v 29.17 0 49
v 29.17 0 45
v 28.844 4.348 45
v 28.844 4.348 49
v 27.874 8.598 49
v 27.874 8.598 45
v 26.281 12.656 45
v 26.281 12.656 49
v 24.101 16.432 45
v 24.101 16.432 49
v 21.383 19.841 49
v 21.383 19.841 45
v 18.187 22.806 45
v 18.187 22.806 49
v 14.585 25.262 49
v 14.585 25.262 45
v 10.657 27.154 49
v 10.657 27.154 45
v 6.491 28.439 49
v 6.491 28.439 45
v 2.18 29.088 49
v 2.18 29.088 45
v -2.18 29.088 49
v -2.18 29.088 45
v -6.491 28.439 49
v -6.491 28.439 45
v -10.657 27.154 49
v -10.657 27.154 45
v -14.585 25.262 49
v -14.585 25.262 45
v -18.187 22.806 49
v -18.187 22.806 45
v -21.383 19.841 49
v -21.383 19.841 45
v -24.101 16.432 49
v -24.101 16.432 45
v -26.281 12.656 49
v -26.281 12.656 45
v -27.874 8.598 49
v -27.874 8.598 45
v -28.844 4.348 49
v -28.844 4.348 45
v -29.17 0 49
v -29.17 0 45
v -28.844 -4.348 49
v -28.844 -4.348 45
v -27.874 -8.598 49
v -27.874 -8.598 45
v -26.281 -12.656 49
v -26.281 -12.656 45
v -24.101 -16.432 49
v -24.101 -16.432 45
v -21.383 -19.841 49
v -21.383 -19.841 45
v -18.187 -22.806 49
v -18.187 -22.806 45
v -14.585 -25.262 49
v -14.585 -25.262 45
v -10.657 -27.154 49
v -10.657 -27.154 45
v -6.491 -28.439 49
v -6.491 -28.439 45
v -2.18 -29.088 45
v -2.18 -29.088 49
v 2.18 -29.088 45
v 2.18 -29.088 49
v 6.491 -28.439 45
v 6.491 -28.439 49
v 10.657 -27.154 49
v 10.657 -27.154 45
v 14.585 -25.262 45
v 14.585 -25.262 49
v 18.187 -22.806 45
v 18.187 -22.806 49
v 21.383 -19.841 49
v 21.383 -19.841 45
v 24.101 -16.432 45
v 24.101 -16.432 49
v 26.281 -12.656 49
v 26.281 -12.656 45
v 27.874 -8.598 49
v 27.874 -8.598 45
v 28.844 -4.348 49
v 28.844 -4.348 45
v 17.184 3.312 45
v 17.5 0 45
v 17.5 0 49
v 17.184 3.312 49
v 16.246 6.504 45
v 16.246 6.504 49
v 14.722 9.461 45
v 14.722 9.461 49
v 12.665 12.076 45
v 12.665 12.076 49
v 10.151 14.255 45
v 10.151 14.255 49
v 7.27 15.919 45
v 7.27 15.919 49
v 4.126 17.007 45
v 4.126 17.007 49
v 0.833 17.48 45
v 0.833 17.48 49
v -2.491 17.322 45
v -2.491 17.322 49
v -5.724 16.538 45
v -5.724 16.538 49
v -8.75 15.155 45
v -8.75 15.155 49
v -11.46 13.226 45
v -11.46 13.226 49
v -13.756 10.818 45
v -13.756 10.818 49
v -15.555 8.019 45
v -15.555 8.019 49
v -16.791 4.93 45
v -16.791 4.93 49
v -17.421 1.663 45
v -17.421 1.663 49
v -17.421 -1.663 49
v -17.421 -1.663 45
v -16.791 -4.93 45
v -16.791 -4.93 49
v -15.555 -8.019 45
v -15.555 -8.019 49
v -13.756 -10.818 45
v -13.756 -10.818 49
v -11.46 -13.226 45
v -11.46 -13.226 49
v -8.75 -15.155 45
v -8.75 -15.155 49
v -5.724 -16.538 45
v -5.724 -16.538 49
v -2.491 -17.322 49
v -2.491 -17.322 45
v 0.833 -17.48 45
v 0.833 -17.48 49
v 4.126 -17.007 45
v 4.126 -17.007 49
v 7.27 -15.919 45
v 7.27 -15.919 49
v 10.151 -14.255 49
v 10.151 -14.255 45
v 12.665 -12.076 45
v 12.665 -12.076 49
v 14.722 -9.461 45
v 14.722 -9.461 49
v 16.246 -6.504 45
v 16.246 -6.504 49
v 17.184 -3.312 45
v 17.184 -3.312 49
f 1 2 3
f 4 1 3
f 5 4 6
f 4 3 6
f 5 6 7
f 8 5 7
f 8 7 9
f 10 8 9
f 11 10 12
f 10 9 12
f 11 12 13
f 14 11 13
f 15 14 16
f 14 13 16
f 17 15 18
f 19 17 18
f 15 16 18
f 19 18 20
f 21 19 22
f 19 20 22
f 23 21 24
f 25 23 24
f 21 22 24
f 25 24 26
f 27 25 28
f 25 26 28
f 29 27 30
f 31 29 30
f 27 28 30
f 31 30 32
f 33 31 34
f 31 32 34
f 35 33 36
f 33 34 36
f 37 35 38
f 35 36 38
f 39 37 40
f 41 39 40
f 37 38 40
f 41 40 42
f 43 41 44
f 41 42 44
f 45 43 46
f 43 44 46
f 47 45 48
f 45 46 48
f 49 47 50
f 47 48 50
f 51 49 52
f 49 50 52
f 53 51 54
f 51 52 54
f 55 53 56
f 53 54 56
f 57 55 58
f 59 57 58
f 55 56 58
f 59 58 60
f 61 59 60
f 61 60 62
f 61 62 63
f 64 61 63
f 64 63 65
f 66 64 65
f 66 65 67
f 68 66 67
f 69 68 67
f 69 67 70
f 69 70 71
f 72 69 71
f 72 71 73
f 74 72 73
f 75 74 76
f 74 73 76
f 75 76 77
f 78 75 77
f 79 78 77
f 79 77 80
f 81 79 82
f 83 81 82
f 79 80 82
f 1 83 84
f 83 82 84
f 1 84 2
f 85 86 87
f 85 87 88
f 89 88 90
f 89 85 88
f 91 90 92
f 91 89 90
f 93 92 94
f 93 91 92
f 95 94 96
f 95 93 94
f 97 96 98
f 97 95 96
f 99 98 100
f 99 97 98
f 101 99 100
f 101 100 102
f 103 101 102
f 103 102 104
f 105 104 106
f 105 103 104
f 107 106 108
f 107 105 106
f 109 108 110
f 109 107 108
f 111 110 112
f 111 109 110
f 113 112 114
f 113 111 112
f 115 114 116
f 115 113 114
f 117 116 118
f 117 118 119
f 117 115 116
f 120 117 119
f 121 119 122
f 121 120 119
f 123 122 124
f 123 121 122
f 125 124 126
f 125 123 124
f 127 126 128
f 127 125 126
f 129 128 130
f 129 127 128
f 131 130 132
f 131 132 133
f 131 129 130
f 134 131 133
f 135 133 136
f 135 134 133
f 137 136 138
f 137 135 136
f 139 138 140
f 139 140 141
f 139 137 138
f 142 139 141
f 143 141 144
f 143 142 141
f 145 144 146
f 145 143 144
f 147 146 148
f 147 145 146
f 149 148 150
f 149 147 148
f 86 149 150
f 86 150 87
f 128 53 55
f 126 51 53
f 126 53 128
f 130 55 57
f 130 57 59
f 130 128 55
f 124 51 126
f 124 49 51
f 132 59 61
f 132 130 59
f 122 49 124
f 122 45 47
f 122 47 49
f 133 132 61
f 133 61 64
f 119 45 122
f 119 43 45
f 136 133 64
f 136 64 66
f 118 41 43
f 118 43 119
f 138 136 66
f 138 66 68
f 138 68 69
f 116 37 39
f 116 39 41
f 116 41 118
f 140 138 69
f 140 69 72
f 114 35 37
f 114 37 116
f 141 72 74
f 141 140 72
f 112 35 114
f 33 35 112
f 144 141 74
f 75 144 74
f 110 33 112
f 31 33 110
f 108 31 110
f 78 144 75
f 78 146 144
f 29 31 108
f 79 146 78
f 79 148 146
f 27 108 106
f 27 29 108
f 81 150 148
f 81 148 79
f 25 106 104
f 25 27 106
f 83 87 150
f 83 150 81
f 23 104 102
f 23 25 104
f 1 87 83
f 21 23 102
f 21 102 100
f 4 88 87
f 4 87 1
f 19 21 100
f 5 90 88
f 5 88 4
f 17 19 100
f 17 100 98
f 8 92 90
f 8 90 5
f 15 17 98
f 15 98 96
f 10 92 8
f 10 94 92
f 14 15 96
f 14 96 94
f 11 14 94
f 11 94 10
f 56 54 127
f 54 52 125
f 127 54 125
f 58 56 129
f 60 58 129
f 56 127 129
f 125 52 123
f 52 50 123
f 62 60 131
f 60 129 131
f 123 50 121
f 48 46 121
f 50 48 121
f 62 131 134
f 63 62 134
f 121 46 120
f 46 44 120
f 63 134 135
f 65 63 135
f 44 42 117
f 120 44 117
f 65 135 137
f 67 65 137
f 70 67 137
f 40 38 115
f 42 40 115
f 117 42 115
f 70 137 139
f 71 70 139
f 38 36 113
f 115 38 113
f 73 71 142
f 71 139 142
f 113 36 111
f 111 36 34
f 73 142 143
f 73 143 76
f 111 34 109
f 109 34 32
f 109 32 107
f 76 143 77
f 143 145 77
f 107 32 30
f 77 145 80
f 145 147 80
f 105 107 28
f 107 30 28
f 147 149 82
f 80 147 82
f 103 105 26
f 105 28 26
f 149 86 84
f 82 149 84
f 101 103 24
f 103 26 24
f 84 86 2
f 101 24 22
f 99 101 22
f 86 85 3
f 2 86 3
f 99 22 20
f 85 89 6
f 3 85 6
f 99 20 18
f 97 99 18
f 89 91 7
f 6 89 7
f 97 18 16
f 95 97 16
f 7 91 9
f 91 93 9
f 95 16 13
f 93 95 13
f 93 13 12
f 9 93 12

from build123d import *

# Parameters (mm, degrees)
CYLINDER008_R     = 17.5
CYLINDER008_DEPTH = 4
CYLINDER007_R     = 29.17
CYLINDER007_DEPTH = 4


with BuildPart() as cylinder008:
    # Cylinder008 → Cylinder008 (new body)
    with BuildSketch(Plane.XY.offset(45)):
        Circle(CYLINDER008_R)
    extrude(amount=CYLINDER008_DEPTH)


with BuildPart() as cut007:
    # Cylinder007 → Cylinder007 (new body)
    with BuildSketch(Plane.XY.offset(45)):
        Circle(CYLINDER007_R)
    extrude(amount=CYLINDER007_DEPTH)

    # Cut007: cut Cylinder008
    add(cylinder008.part, mode=Mode.SUBTRACT)


solid = cut007.part
